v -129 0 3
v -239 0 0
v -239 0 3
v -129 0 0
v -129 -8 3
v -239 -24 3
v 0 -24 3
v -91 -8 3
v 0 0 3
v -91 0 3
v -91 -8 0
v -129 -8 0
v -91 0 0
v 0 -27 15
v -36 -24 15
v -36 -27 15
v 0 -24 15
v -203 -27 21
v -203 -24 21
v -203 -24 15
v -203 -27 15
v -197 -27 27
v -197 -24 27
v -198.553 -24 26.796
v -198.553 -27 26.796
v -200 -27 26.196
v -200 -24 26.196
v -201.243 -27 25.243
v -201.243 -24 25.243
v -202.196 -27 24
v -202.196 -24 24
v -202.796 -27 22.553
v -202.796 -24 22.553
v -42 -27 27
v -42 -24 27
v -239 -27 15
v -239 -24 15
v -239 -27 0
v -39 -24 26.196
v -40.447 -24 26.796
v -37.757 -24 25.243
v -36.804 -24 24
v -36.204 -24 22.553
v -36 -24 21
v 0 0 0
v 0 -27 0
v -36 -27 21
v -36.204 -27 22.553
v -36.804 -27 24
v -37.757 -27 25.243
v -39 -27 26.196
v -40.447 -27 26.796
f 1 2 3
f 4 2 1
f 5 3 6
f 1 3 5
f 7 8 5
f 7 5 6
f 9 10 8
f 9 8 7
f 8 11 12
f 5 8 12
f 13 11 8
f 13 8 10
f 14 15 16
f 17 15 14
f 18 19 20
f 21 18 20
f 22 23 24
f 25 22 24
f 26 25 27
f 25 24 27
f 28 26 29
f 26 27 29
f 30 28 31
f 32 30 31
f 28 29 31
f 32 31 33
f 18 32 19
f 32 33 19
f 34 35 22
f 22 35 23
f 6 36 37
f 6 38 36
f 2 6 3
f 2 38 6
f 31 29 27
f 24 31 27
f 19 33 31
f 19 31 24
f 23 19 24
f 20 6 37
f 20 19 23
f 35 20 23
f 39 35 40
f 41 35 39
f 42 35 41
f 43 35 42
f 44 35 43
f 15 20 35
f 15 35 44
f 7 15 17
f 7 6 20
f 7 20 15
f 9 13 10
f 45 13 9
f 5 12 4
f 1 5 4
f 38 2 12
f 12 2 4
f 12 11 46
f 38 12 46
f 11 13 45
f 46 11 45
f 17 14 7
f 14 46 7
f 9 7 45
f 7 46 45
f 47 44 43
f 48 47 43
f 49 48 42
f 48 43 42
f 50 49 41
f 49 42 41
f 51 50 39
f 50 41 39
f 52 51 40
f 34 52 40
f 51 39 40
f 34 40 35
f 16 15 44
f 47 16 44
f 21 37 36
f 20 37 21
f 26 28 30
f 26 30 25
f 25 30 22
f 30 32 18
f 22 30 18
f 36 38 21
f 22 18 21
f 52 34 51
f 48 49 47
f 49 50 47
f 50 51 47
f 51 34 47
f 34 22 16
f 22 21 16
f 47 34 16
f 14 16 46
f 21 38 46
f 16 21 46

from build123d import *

# Parameters (mm, degrees)
SKETCH2_W           = 239
SKETCH2_H           = 27
BOSS_EXTRUDE1_DEPTH = 3
SKETCH3_W           = 239
SKETCH3_H           = 3
BOSS_EXTRUDE2_DEPTH = 12
BOSS_EXTRUDE4_DEPTH = 3
SKETCH5_W           = 38
SKETCH5_H           = 8
CUT_EXTRUDE1_DEPTH  = 3


with BuildPart() as part:
    # Sketch2 → Boss-Extrude1 (new body)
    with BuildSketch(Plane.XY):
        with Locations((-119.5, -13.5)):
            Rectangle(SKETCH2_W, SKETCH2_H)
    extrude(amount=BOSS_EXTRUDE1_DEPTH)

    # Sketch3 → Boss-Extrude2 (add)
    with BuildSketch(Plane.XY.offset(3)):
        with Locations((-119.5, -25.5)):
            Rectangle(SKETCH3_W, SKETCH3_H)
    extrude(amount=BOSS_EXTRUDE2_DEPTH)

    # Sketch4 → Boss-Extrude4 (add)
    with BuildSketch(Plane(origin=(0, -24, 0), x_dir=(1, 0, 0), z_dir=(0, 1, 0))):
        with BuildLine():
            Line((-203, -15), (-36, -15))
            Line((-36, -15), (-36, -21))
            ThreePointArc((-36, -21), (-37.757359313, -25.242640687), (-42, -27))
            Line((-42, -27), (-197, -27))
            ThreePointArc((-197, -27), (-201.242640687, -25.242640687), (-203, -21))
            Line((-203, -21), (-203, -15))
        make_face()
    extrude(amount=-BOSS_EXTRUDE4_DEPTH)

    # Sketch5 → Cut-Extrude1 (cut)
    with BuildSketch(Plane(origin=(0, 0, 0), x_dir=(-1, 0, 0), z_dir=(0, 0, -1))):
        with Locations((110, -4)):
            Rectangle(SKETCH5_W, SKETCH5_H)
    extrude(amount=-CUT_EXTRUDE1_DEPTH, mode=Mode.SUBTRACT)


solid = part.part
